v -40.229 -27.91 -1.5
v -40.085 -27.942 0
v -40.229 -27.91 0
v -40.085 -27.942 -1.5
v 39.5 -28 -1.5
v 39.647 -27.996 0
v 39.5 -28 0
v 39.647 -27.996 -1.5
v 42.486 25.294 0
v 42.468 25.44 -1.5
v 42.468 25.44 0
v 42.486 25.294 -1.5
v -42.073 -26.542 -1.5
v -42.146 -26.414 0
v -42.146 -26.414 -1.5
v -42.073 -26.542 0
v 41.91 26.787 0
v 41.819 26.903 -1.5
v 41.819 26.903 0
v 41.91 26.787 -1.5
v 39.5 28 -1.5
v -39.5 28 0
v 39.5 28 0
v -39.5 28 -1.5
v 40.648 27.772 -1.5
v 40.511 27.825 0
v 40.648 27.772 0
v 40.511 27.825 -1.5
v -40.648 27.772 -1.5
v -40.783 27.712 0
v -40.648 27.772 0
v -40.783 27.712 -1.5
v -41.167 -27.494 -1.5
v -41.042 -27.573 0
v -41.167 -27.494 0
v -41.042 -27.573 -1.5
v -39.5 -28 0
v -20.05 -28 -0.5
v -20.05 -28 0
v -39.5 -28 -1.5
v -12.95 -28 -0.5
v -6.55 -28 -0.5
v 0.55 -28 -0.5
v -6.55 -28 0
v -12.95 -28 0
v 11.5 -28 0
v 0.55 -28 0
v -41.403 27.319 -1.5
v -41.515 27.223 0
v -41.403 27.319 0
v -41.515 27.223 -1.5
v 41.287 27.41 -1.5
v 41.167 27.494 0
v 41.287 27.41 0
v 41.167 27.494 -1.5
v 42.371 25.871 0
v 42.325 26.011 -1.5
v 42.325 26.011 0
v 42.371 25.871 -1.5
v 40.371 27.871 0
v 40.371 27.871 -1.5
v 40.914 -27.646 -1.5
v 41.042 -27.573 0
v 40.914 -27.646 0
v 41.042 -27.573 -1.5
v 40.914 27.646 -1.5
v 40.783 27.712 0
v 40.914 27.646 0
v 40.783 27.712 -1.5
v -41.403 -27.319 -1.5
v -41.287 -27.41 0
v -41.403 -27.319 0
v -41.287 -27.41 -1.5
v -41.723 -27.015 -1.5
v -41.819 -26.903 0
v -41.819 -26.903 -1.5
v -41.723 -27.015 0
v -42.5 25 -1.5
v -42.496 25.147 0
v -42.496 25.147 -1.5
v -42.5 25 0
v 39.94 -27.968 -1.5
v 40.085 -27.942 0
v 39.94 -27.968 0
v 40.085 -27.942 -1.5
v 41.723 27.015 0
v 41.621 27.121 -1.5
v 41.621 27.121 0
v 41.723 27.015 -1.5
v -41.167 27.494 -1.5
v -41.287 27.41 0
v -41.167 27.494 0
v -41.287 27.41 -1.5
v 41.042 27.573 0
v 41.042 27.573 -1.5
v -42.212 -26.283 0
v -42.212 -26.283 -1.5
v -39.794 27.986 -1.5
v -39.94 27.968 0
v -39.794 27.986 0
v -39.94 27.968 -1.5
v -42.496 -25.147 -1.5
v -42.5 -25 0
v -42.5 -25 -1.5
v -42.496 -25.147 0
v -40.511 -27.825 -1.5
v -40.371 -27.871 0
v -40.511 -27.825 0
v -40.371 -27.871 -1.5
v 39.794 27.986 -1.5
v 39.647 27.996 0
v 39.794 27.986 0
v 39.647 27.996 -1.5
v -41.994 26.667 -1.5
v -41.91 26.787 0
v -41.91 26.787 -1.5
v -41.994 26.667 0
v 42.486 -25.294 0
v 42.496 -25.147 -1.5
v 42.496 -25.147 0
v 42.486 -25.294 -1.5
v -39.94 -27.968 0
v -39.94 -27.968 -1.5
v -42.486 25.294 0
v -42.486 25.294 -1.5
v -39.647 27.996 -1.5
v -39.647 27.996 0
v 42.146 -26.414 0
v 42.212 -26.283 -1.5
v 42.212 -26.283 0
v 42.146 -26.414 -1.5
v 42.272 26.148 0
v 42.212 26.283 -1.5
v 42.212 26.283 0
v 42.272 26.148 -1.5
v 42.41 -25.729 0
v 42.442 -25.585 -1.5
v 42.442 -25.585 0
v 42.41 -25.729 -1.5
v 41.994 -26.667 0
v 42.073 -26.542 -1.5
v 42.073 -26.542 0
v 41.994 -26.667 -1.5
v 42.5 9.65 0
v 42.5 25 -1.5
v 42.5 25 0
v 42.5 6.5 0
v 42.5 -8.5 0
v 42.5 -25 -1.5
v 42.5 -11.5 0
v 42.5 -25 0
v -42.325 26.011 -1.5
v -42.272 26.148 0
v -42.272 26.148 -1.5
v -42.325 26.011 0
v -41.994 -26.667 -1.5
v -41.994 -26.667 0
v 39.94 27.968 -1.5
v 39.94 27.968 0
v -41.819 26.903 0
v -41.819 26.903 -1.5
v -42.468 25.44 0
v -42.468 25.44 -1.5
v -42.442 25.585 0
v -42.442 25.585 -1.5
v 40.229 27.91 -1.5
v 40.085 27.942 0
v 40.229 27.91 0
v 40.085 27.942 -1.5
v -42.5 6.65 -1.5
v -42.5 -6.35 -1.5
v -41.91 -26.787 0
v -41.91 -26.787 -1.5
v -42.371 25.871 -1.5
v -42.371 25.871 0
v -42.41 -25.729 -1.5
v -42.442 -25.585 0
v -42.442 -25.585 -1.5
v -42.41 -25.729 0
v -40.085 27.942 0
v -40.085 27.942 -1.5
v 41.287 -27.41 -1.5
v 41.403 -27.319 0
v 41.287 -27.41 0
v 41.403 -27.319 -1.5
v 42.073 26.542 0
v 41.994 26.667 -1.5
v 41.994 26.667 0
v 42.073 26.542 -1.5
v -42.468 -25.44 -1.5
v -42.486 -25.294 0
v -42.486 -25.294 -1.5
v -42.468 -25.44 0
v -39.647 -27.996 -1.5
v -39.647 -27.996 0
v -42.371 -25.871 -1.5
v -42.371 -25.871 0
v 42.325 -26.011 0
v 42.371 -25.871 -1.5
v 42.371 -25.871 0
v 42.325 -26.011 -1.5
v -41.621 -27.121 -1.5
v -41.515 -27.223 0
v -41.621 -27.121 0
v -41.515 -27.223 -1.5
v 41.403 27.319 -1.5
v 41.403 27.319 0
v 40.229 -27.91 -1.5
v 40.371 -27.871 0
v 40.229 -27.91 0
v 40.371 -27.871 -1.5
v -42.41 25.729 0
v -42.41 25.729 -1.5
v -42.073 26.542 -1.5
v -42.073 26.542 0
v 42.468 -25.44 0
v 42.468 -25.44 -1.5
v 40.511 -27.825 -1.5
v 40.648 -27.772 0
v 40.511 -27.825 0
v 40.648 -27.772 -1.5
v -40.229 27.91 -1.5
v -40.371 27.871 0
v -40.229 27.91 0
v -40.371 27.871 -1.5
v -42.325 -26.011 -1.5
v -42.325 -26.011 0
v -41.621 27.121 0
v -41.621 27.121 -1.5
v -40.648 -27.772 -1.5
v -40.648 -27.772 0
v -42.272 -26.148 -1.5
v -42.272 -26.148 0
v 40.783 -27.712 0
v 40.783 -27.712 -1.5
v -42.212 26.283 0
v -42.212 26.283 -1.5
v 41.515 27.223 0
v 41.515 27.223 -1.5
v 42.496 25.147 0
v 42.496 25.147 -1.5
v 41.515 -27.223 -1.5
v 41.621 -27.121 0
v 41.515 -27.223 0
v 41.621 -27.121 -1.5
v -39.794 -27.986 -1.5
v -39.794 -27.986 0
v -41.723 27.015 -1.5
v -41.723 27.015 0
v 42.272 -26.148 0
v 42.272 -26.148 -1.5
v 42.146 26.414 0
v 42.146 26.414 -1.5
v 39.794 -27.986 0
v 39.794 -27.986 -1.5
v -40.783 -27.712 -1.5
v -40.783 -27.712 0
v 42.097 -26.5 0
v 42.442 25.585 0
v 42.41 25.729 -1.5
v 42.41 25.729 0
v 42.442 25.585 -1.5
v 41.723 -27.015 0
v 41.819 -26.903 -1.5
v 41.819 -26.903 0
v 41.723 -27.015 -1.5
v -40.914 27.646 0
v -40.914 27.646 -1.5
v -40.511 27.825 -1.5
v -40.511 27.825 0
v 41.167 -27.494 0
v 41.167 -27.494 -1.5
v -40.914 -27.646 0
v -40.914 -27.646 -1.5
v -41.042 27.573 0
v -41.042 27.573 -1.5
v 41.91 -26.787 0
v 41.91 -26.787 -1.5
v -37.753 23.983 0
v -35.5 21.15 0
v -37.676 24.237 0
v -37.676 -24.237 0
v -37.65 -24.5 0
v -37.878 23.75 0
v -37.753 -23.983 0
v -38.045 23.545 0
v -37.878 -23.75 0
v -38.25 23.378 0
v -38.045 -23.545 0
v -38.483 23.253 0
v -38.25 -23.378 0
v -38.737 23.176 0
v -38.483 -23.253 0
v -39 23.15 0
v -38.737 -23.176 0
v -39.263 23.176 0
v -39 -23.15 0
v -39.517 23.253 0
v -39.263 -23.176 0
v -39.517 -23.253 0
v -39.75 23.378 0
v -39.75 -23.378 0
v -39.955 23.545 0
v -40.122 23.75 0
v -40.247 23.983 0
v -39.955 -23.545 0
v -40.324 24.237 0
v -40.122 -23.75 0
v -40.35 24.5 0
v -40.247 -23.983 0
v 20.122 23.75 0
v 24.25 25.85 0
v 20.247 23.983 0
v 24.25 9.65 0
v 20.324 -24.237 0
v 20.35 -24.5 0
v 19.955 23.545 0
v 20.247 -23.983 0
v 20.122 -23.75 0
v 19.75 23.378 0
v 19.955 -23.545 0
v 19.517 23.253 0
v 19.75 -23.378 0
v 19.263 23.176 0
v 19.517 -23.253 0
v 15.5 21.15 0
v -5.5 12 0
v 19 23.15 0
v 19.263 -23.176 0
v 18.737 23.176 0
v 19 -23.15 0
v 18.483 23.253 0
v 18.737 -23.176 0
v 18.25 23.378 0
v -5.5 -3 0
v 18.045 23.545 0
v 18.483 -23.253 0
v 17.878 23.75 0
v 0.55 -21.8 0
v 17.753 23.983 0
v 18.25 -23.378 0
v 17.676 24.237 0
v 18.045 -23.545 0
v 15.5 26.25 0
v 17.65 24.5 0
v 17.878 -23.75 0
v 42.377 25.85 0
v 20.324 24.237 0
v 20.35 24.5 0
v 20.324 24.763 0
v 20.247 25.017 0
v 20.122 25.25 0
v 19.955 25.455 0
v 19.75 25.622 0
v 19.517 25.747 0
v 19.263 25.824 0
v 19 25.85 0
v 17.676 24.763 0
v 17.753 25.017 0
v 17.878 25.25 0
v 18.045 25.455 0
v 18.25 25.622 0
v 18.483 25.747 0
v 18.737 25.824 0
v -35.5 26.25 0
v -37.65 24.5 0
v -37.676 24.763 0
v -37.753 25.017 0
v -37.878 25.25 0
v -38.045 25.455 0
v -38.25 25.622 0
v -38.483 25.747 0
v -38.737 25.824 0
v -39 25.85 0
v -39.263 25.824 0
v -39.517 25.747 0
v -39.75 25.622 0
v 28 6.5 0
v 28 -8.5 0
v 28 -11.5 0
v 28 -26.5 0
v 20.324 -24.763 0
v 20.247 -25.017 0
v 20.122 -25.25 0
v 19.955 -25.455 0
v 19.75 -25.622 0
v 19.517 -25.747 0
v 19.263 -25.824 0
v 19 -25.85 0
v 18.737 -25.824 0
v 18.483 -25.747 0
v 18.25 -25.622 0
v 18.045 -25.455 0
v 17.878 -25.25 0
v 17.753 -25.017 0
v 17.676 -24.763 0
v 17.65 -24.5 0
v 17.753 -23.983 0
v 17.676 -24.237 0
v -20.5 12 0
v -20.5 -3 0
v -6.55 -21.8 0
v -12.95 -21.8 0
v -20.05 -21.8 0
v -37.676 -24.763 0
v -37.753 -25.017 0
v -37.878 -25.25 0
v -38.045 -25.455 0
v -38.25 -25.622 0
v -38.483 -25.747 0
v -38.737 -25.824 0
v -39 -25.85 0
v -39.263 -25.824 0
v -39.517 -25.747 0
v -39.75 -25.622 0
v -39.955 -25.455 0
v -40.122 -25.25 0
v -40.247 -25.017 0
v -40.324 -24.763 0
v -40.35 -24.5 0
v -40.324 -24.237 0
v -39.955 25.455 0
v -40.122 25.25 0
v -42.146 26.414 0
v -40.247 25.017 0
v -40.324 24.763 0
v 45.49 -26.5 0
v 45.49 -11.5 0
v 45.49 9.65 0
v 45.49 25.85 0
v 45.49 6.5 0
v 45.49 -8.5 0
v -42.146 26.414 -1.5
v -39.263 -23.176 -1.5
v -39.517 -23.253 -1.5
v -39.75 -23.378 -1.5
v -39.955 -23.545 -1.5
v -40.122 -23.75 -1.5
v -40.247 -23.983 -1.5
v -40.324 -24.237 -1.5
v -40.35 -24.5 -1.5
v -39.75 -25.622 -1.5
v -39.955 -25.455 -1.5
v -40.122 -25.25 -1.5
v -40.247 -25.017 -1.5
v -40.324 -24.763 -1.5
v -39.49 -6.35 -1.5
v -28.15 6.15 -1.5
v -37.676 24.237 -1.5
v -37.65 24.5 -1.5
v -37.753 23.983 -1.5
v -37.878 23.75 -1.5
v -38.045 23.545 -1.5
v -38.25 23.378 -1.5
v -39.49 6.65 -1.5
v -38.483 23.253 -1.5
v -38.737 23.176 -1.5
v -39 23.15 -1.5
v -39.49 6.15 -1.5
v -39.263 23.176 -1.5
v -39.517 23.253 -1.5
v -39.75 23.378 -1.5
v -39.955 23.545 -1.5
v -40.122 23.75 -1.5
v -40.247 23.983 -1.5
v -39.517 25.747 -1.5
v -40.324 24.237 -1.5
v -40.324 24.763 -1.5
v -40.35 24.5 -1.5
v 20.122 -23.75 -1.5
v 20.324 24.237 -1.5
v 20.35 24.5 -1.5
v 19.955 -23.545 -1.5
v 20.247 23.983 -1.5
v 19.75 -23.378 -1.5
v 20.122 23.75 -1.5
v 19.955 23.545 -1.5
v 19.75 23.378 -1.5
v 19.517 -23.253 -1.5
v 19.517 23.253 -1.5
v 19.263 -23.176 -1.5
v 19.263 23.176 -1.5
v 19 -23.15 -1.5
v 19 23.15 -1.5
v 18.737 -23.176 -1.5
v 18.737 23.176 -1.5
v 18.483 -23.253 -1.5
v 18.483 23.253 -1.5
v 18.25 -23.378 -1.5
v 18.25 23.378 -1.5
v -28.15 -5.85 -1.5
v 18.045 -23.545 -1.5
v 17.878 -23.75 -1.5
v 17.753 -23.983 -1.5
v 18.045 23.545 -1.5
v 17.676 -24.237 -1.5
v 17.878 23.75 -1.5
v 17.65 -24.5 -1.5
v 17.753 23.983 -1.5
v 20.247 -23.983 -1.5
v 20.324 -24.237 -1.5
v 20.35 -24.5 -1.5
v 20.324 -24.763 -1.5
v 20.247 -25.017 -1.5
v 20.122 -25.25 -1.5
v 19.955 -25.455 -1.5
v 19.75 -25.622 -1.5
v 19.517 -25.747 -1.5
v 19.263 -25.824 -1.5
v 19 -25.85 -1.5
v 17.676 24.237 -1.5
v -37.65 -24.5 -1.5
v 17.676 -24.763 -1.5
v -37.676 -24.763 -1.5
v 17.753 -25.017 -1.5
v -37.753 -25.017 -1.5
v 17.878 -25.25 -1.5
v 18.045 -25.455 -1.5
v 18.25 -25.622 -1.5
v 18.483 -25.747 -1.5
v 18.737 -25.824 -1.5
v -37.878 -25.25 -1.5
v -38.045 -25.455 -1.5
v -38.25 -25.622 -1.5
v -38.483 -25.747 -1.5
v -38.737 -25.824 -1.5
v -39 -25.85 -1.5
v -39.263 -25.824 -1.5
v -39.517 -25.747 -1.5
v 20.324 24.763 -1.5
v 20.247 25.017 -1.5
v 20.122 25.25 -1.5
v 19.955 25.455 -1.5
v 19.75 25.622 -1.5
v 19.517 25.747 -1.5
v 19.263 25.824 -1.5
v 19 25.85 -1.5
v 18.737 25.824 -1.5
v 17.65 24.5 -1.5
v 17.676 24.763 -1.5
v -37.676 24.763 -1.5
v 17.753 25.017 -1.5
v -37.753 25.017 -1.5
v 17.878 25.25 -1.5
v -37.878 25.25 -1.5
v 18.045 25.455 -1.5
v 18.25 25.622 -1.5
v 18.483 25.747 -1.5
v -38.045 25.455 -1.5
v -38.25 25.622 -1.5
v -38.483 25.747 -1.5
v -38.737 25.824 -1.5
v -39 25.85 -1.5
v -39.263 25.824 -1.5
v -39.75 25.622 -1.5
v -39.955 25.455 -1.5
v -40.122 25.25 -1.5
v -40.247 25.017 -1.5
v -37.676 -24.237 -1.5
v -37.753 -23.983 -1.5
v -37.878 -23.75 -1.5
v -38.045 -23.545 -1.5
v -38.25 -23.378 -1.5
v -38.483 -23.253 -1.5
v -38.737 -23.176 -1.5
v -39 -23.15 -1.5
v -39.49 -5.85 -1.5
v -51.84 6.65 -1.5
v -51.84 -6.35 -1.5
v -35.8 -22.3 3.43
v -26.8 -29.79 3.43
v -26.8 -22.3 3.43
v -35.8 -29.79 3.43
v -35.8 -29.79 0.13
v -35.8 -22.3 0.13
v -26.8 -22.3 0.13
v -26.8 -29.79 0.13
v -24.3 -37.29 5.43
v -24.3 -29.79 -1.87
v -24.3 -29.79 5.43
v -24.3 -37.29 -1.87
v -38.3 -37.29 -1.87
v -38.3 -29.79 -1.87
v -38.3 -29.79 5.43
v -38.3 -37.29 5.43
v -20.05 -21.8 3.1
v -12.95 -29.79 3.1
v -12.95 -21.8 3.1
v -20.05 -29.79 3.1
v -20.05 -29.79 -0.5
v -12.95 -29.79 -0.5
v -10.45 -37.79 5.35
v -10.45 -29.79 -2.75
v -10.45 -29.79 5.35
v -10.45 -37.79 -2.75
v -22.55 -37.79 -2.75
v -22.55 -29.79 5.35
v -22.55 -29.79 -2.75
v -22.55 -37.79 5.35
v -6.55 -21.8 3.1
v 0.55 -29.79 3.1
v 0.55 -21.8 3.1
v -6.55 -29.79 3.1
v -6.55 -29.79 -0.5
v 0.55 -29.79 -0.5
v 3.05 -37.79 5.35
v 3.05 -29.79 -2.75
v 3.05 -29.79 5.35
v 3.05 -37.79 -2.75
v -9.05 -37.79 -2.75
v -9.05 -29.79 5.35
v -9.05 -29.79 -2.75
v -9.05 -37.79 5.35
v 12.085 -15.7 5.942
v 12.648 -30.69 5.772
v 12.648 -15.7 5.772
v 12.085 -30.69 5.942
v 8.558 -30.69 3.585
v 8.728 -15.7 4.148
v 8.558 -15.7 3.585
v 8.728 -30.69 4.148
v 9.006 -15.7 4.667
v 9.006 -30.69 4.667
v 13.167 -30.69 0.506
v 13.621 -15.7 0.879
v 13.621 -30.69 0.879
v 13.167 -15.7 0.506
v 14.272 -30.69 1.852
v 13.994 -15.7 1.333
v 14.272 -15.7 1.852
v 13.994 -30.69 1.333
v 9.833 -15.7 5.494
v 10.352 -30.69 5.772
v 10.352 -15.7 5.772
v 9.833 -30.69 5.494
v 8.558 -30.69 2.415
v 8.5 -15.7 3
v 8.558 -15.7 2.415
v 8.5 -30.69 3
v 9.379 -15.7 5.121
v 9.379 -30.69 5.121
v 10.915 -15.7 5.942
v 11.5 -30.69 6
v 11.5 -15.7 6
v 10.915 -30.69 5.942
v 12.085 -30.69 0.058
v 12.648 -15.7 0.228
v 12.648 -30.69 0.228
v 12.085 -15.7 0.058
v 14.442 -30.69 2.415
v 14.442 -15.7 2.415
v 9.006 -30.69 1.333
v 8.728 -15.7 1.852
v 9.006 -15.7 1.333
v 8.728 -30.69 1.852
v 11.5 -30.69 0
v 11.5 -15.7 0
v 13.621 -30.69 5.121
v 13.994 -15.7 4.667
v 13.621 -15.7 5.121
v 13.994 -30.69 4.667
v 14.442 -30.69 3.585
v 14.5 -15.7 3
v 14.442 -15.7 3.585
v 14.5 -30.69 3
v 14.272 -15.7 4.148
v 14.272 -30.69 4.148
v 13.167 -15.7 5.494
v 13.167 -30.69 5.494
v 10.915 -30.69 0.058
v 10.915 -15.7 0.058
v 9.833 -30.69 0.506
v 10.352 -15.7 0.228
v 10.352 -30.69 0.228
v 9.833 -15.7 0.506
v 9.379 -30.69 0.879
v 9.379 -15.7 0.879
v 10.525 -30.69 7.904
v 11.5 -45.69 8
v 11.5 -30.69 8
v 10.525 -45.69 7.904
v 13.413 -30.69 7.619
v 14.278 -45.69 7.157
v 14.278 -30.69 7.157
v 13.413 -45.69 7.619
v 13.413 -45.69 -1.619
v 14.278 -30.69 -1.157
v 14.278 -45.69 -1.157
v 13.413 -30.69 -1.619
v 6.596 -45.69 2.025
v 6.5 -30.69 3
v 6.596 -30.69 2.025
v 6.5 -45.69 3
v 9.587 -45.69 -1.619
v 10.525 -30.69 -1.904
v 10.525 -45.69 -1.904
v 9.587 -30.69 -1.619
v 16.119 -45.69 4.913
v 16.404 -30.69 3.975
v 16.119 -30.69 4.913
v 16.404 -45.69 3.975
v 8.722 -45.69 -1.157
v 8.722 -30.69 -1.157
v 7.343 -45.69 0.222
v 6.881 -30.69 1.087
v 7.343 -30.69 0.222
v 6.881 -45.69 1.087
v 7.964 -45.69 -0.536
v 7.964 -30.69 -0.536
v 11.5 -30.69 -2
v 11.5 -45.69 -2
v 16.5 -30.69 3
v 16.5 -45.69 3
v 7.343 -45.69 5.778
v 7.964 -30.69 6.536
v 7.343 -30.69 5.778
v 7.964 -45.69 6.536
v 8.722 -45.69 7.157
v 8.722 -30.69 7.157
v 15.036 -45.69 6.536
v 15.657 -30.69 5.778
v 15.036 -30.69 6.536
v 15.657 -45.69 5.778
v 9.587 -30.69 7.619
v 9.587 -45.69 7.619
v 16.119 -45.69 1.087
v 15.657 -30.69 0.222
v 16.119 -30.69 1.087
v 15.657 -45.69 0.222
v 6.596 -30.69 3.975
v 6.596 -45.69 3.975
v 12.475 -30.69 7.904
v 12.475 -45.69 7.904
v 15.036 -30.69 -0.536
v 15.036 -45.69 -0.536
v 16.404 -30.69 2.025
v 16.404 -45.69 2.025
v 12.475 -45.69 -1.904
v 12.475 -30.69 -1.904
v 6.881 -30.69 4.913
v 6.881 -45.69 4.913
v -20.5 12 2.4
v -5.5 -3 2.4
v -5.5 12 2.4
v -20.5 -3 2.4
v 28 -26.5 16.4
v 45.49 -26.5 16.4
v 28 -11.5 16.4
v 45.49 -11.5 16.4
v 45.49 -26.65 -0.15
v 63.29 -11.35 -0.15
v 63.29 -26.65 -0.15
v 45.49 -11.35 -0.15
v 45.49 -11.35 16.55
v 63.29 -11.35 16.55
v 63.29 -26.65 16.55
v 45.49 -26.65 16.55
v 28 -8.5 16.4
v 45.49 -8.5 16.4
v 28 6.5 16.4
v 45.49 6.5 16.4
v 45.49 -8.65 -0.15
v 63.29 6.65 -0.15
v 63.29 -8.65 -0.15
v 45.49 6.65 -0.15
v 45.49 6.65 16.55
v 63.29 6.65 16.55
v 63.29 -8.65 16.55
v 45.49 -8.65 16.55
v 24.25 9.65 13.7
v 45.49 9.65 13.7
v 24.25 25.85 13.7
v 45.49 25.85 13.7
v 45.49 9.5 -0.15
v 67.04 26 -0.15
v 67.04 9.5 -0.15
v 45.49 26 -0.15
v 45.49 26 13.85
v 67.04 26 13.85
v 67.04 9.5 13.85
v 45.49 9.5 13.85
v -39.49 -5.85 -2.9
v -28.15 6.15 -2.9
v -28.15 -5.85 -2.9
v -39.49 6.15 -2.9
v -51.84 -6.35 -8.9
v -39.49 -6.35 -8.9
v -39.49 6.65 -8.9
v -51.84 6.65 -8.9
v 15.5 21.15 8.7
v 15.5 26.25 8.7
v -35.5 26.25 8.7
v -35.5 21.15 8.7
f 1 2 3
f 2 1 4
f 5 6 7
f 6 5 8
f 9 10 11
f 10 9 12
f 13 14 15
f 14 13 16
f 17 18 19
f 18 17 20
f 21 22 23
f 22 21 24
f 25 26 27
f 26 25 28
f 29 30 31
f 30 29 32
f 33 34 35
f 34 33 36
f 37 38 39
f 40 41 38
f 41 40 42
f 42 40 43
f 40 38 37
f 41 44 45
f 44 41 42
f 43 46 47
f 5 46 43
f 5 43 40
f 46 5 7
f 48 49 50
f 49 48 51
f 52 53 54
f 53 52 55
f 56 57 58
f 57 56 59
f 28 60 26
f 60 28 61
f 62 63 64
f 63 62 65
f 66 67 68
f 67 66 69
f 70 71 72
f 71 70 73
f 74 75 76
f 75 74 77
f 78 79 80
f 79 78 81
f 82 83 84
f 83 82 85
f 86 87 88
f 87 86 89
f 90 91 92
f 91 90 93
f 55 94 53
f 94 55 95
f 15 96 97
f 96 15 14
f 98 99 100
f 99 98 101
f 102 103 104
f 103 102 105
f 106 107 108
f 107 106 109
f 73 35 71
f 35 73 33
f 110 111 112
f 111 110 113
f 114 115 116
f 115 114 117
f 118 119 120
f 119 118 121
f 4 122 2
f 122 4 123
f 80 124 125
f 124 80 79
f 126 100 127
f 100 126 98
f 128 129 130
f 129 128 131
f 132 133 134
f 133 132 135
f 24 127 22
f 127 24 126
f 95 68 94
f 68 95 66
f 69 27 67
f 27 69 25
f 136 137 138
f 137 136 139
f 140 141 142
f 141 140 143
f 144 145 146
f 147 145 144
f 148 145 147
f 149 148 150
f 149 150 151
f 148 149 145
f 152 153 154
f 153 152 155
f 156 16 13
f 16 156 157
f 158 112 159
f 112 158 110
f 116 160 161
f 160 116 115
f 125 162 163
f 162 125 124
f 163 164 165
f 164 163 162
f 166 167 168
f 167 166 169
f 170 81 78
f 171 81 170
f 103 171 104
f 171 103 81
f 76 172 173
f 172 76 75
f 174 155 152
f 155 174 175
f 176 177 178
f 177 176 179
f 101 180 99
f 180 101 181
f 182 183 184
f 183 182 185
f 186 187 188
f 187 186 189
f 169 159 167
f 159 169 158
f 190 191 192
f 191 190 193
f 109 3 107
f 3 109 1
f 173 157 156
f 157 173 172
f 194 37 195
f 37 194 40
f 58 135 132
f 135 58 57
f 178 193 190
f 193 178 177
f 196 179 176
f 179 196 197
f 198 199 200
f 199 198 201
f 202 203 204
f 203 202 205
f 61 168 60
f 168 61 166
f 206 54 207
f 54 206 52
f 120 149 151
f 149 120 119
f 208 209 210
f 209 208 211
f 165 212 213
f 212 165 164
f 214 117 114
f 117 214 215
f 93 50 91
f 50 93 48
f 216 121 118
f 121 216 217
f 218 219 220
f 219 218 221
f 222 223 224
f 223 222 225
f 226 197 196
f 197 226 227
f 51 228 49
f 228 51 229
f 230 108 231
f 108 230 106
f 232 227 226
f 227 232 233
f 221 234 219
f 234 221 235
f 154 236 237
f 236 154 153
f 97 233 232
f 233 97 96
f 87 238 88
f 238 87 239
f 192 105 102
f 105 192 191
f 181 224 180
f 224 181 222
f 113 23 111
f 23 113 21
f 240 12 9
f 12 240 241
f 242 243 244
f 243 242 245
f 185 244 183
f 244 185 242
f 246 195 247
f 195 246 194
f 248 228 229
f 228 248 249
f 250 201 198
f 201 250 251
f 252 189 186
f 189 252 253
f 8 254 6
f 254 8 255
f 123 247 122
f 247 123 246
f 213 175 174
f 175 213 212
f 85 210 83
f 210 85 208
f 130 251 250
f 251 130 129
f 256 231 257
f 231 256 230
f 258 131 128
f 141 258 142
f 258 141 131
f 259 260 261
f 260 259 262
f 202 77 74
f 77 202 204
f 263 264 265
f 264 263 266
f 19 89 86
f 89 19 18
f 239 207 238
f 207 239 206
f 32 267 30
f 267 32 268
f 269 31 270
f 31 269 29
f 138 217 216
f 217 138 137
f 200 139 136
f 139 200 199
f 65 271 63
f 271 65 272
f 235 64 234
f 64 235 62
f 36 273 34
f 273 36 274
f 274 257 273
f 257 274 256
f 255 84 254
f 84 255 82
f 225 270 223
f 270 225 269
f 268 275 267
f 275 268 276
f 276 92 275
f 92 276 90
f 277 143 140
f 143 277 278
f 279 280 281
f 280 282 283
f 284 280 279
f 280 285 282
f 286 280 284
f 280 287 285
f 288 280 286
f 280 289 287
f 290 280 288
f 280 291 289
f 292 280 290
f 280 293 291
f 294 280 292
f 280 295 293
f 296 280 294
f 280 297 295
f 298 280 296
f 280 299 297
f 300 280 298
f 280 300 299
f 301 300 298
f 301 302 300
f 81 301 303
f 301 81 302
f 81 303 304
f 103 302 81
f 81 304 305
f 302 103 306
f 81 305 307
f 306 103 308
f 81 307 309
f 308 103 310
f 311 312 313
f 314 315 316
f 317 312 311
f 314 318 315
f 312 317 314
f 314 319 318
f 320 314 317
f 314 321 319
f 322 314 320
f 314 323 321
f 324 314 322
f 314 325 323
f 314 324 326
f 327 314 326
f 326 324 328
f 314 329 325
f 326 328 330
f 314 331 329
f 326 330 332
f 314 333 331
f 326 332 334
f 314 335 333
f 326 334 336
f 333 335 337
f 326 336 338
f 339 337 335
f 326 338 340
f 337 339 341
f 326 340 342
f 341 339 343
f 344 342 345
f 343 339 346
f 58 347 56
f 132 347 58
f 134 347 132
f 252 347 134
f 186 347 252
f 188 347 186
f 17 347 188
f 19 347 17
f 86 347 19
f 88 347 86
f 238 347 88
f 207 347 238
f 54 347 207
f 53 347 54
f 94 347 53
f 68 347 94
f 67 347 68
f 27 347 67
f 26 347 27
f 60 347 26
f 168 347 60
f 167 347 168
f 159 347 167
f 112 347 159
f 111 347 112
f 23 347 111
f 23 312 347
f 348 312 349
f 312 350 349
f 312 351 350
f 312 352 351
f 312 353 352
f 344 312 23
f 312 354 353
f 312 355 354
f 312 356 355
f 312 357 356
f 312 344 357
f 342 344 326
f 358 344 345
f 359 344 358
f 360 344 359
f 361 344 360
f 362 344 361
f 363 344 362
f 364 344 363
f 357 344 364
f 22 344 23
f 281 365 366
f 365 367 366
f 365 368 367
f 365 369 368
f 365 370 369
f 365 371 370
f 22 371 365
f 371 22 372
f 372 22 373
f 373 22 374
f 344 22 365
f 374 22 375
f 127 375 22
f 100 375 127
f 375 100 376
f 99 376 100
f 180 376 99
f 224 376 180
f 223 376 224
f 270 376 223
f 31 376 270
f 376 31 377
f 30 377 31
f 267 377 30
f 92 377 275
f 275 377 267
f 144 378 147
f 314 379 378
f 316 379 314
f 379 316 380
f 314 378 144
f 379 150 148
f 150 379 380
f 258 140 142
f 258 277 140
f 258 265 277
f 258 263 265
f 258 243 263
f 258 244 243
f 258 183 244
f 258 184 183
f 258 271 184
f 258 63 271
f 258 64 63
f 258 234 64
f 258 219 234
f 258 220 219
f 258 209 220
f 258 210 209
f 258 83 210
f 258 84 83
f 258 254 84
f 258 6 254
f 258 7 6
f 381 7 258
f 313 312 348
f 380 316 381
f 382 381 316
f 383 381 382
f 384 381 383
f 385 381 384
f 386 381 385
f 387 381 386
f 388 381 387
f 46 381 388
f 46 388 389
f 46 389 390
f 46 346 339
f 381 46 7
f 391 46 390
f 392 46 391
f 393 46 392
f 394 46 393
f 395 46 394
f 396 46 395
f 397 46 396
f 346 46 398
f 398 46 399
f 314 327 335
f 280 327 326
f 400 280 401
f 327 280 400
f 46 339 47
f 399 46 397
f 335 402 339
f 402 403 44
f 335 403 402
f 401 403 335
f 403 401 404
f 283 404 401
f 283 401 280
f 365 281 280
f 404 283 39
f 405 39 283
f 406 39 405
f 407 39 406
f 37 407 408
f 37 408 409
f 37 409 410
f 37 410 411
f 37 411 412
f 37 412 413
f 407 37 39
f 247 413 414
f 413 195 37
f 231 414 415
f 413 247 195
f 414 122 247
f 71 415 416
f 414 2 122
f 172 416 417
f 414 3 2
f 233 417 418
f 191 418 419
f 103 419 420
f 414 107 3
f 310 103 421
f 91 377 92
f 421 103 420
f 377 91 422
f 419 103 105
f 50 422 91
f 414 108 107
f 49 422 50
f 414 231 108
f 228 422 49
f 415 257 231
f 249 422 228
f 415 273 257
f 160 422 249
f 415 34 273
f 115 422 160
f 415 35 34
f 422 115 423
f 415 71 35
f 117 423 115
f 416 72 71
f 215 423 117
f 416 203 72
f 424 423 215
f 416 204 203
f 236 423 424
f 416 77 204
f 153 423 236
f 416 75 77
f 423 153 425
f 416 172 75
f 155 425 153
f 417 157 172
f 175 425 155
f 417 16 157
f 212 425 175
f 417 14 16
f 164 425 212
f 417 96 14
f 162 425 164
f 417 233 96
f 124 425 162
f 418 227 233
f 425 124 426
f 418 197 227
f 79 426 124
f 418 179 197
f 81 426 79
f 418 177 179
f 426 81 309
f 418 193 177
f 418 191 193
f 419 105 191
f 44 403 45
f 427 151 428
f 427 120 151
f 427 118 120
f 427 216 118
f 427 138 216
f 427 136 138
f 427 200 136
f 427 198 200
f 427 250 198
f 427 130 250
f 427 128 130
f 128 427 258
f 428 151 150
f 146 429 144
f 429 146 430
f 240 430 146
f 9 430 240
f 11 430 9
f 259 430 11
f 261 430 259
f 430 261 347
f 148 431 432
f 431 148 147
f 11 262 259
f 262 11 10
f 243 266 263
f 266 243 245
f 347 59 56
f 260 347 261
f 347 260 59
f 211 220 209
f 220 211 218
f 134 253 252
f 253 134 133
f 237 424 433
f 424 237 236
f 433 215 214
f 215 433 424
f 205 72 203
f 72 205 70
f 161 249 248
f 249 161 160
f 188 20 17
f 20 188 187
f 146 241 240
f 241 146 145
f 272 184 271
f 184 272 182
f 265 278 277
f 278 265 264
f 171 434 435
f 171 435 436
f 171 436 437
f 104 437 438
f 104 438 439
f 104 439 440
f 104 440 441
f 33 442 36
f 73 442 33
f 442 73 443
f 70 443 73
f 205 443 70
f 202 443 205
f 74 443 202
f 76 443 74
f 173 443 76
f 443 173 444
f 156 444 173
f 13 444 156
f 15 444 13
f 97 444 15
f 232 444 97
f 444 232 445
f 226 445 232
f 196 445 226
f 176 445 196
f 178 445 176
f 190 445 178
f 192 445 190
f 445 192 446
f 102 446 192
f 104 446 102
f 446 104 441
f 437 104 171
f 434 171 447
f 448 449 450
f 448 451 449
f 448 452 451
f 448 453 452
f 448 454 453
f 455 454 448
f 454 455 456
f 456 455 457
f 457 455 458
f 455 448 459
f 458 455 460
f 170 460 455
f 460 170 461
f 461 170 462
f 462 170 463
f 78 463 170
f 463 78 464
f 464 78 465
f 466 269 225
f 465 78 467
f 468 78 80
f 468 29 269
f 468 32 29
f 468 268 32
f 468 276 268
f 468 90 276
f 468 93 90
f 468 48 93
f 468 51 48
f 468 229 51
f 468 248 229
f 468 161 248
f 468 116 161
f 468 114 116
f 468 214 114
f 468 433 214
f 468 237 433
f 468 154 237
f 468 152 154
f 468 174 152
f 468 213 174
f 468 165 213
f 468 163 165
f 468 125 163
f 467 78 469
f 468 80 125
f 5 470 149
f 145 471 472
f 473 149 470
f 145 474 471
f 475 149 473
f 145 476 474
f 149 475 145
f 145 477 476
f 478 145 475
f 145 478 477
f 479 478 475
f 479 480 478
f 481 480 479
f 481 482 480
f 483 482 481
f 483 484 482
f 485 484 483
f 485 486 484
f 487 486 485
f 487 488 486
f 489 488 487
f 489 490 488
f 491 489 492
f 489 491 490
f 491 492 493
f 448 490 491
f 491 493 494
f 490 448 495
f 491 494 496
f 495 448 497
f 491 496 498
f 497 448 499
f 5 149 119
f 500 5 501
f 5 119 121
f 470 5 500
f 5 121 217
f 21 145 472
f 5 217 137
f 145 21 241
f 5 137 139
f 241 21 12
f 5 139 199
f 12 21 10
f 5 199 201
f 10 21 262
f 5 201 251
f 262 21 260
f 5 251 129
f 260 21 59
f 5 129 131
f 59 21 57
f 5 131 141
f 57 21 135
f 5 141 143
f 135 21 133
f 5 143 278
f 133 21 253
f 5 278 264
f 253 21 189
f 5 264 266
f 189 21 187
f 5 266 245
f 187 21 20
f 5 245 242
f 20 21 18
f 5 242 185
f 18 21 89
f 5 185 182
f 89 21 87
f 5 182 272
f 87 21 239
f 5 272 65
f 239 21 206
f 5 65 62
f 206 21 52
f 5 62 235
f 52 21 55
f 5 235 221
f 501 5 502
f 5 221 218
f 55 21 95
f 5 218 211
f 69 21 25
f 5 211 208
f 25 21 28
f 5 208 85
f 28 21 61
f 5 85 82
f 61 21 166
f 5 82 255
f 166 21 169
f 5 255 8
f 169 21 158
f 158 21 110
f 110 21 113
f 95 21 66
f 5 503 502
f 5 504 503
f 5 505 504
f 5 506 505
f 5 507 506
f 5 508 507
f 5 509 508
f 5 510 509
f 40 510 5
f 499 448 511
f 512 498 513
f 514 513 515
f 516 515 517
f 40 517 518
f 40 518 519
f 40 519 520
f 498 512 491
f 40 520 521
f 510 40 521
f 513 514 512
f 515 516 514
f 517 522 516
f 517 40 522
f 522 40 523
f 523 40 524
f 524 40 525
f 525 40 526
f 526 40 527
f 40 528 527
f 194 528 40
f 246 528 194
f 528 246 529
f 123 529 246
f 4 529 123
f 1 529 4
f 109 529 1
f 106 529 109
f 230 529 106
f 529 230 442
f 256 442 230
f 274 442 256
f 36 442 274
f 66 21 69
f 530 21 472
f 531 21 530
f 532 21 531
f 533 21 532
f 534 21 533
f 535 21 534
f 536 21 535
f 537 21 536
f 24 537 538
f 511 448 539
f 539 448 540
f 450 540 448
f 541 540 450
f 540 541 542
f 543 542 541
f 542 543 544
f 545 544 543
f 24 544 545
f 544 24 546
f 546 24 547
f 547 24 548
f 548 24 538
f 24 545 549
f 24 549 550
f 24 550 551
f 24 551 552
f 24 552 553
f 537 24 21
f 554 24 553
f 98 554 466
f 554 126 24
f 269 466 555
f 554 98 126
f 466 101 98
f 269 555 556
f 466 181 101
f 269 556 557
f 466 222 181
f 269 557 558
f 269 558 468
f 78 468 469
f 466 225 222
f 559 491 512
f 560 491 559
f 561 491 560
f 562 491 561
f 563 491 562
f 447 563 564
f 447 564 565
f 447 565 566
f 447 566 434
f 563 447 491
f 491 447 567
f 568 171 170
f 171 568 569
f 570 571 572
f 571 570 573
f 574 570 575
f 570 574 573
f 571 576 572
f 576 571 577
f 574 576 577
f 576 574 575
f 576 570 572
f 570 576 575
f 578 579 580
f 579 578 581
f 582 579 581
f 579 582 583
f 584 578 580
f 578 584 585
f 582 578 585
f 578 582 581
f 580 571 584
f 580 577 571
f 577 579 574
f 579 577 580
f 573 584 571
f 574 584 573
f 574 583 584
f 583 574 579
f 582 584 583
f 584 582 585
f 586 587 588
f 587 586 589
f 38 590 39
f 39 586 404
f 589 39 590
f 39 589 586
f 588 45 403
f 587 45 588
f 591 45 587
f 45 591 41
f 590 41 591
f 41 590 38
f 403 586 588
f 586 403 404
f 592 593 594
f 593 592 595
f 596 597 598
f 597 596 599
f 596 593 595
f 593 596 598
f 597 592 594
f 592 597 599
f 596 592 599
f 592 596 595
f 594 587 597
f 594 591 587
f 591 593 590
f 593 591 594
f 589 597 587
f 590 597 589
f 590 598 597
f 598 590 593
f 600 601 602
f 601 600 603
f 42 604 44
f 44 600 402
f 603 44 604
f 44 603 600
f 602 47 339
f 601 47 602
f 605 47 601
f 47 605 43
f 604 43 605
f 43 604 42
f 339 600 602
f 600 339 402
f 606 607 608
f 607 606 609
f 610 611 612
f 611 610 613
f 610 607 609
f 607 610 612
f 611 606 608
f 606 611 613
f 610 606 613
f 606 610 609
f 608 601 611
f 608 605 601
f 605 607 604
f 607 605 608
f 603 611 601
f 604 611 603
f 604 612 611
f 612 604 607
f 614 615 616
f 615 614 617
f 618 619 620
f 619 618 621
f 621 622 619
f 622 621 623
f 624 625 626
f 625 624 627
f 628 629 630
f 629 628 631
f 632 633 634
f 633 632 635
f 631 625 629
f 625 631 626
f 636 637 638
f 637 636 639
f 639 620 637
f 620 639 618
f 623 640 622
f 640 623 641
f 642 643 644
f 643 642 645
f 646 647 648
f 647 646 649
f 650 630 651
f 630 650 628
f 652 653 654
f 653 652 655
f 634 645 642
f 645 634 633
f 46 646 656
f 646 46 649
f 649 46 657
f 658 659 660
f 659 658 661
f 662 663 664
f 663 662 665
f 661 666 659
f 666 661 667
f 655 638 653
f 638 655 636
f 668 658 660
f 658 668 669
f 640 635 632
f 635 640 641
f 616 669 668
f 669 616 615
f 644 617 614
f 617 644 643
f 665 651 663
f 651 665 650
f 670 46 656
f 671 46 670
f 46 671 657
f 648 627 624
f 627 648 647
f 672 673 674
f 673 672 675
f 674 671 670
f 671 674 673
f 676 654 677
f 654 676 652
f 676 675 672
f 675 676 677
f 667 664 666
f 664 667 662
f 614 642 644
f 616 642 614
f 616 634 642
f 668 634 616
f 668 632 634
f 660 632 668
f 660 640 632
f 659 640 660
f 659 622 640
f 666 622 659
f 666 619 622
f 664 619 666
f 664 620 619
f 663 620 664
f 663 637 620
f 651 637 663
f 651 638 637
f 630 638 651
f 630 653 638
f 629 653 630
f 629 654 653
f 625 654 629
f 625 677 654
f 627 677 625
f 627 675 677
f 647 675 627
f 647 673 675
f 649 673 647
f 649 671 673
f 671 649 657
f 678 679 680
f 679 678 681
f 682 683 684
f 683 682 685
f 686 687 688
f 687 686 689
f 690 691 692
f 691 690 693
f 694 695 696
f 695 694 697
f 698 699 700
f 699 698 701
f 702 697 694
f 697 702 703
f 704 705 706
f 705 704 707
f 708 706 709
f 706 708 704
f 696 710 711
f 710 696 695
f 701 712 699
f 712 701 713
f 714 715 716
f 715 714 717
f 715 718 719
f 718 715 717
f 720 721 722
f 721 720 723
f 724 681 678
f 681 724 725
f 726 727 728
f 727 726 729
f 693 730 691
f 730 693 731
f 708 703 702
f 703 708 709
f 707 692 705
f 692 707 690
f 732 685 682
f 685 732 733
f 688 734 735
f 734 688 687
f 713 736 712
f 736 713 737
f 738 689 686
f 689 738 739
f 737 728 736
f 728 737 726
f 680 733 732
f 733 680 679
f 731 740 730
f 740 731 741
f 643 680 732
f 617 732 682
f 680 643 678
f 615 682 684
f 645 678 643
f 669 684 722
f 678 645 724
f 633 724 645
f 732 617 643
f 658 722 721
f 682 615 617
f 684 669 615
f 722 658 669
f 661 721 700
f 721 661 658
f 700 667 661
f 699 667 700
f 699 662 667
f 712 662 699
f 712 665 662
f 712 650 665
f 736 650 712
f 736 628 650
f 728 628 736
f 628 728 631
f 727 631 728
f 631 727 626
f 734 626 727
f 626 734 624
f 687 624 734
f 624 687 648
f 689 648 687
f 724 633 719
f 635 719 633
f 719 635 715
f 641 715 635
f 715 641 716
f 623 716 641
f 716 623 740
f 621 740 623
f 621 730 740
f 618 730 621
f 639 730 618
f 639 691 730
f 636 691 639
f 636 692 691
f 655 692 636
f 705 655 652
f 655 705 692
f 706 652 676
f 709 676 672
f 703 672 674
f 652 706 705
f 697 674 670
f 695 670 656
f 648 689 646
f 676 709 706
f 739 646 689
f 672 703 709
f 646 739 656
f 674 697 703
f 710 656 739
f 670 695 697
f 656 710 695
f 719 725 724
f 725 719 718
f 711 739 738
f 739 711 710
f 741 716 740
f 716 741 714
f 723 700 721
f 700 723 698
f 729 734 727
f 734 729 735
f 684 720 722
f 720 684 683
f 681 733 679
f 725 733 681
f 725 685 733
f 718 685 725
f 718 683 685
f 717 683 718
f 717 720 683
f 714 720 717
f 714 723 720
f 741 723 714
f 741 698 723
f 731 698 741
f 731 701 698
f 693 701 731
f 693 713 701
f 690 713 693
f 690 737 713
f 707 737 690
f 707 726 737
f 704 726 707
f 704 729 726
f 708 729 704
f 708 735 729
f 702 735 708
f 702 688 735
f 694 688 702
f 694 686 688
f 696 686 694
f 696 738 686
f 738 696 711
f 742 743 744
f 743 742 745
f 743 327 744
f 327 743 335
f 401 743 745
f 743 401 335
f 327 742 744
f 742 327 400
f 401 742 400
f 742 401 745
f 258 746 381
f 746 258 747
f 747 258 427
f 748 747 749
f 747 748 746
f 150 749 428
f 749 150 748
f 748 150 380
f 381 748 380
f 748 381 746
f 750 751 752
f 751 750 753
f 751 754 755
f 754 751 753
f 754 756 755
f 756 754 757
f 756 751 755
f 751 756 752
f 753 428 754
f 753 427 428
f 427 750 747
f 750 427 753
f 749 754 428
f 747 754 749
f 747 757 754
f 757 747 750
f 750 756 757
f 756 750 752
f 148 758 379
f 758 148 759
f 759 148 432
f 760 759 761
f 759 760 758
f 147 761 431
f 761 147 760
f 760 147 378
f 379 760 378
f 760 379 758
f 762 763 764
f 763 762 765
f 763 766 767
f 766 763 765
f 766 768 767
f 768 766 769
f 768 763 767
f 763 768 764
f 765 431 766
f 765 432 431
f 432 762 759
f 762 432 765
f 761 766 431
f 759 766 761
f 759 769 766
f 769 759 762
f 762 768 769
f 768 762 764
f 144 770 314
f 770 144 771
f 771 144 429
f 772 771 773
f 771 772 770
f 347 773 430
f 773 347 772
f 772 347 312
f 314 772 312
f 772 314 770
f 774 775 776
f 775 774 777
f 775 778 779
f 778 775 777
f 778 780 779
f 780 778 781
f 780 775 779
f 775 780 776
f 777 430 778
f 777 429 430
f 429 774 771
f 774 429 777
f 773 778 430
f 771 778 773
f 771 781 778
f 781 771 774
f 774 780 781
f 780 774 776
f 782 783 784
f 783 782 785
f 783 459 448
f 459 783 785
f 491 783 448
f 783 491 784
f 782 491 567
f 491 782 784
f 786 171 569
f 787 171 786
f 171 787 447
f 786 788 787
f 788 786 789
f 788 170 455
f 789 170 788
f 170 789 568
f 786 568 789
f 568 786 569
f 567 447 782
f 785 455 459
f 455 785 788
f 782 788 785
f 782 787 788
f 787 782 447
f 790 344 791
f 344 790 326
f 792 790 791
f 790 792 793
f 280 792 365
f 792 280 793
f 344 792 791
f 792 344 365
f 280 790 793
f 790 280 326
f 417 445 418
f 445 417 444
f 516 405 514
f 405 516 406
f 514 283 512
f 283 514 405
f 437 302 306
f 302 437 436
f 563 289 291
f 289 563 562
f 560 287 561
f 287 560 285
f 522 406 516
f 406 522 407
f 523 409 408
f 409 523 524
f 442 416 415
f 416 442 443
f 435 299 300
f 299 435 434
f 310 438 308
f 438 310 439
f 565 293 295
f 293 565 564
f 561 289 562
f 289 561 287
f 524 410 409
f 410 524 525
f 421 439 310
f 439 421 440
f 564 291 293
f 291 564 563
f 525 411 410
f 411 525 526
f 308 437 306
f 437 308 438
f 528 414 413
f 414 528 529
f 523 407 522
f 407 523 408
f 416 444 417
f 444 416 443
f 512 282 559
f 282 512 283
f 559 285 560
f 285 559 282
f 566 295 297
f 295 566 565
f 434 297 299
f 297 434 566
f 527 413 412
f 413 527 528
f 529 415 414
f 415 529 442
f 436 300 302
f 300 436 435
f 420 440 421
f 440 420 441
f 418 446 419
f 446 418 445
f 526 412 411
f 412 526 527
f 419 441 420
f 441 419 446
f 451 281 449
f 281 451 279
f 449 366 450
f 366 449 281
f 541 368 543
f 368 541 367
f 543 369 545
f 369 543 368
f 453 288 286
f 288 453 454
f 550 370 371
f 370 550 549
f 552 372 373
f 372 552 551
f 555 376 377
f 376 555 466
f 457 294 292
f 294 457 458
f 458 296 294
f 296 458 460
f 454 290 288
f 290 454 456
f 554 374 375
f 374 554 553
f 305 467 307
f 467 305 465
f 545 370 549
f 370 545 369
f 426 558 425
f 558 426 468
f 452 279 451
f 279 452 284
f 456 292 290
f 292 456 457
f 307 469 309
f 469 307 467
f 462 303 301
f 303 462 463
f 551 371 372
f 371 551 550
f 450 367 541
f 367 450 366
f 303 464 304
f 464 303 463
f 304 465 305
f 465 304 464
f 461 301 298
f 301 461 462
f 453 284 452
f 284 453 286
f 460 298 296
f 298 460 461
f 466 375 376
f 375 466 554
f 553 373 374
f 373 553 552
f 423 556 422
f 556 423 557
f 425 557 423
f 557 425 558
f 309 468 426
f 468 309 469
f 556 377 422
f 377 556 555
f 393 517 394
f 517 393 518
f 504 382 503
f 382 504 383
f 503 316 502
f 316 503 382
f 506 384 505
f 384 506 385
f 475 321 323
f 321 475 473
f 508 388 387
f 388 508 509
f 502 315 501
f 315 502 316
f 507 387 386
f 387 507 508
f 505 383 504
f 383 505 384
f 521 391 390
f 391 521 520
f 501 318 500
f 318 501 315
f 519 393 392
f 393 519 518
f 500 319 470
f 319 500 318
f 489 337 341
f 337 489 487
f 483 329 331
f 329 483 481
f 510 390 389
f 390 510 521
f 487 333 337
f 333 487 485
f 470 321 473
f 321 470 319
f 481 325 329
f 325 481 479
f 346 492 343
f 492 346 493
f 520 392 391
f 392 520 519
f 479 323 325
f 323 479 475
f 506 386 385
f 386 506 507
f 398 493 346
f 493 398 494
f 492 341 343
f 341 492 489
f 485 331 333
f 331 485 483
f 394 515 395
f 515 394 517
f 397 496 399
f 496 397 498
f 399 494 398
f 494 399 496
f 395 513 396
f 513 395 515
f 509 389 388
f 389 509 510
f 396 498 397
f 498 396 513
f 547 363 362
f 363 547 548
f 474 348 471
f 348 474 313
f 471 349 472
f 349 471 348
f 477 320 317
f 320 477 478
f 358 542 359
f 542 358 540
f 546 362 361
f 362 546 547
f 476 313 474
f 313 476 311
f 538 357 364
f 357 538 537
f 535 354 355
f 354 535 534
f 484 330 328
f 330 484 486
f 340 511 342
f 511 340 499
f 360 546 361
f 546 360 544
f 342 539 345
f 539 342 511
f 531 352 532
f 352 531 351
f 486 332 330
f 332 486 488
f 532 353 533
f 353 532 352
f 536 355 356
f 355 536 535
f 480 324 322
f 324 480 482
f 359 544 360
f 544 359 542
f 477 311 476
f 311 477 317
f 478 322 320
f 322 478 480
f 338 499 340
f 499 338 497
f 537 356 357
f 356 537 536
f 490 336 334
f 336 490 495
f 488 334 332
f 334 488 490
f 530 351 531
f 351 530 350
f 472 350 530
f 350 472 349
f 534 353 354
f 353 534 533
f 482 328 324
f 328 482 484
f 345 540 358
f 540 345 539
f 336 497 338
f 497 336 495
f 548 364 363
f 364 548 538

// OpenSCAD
// Start: lazy_union
default_5_default_5();
// End: lazy_union

// Modules.

// 'PartMaterial undef-default - default 5.0'
module default_5_default_5() {
  // 'None : _combine_solids_and_holes'
  union() {
    // '_combine_solids_and_holes'
    difference() {
      // 'default : _combine_solids_and_holes'
      union() {
        // 'board'
        multmatrix(m=[[1.0, 0.0, 0.0, 0.0], [0.0, 1.0, 0.0, 0.0], [0.0, 0.0, 1.0, -0.75], [0.0, 0.0, 0.0, 1.0]]) {
          // 'board : _combine_solids_and_holes'
          union() {
            // 'hull'
            multmatrix(m=[[1.0, 0.0, 0.0, -42.5], [0.0, 1.0, 0.0, -28.0], [0.0, 0.0, 1.0, -0.75], [0.0, 0.0, 0.0, 1.0]]) {
              // 'hull : _combine_solids_and_holes'
              union() {
                // 'hull'
                linear_extrude(height=1.5, twist=0.0, slices=4, scale=[1.0, 1.0]) {
                  polygon(points=[[3.0, 0.0], [82.0, 0.0], [82.14720302298225, 0.003613631384482119], [82.29405142098868, 0.014445819983408104], [82.44019142336609, 0.03247047010565529], [82.58527096604838, 0.05764415879030649], [82.7289405397098, 0.08990624041636508], [82.87085403176339, 0.1291789928033702], [83.01066956017667, 0.17536780445093392], [83.14805029709527, 0.228361402466136], [83.28266528029084, 0.2880321206296661], [83.414190210478, 0.35423620695493074], [83.54230823257967, 0.4268141699991794], [83.66671069905881, 0.50559116309236], [83.7870979134773, 0.5903774055580606], [83.90317985249094, 0.6809686399117845], [84.01467686454106, 0.7771466239351184], [84.12132034355965, 0.8786796564403532], [84.22285337606488, 0.9853231354589407], [84.31903136008822, 1.0968201475090595], [84.40962259444194, 1.2129020865226963], [84.49440883690764, 1.33328930094119], [84.57318583000082, 1.4576917674203314], [84.64576379304506, 1.5858097895220038], [84.71196787937033, 1.7173347197091513], [84.77163859753387, 1.8519497029047285], [84.82463219554907, 1.9893304398233378], [84.87082100719662, 2.129145968236611], [84.91009375958363, 2.271059460290207], [84.94235584120969, 2.414729033951614], [84.96752952989435, 2.5598085766339143], [84.98555418001659, 2.705948579011318], [84.99638636861552, 2.8527969770177455], [85.0, 2.9999999999999996], [85.0, 53.0], [84.99638636861552, 53.147203022982254], [84.98555418001659, 53.29405142098868], [84.96752952989435, 53.44019142336609], [84.94235584120969, 53.585270966048384], [84.91009375958363, 53.72894053970979], [84.87082100719662, 53.870854031763386], [84.82463219554906, 54.01066956017666], [84.77163859753387, 54.14805029709527], [84.71196787937033, 54.28266528029084], [84.64576379304506, 54.41419021047799], [84.57318583000081, 54.542308232579664], [84.49440883690764, 54.666710699058804], [84.40962259444193, 54.7870979134773], [84.3190313600882, 54.90317985249093], [84.22285337606488, 55.01467686454105], [84.12132034355965, 55.12132034355964], [84.01467686454106, 55.22285337606487], [83.90317985249094, 55.3190313600882], [83.7870979134773, 55.40962259444193], [83.66671069905881, 55.49440883690763], [83.54230823257966, 55.57318583000081], [83.414190210478, 55.645763793045056], [83.28266528029084, 55.71196787937032], [83.14805029709527, 55.77163859753385], [83.01066956017667, 55.82463219554905], [82.87085403176339, 55.87082100719662], [82.7289405397098, 55.910093759583624], [82.58527096604838, 55.94235584120968], [82.44019142336609, 55.96752952989433], [82.29405142098868, 55.98555418001658], [82.14720302298225, 55.996386368615504], [82.0, 55.999999999999986], [3.0, 56.0], [2.852796977017746, 55.99638636861552], [2.7059485790113182, 55.98555418001659], [2.5598085766339143, 55.96752952989434], [2.4147290339516143, 55.94235584120969], [2.271059460290207, 55.91009375958363], [2.129145968236611, 55.870821007196625], [1.9893304398233378, 55.824632195549064], [1.8519497029047285, 55.77163859753386], [1.717334719709152, 55.711967879370334], [1.5858097895220038, 55.64576379304506], [1.4576917674203314, 55.57318583000082], [1.3332893009411895, 55.49440883690764], [1.2129020865226958, 55.409622594441934], [1.096820147509059, 55.31903136008821], [0.9853231354589402, 55.222853376064876], [0.8786796564403523, 55.121320343559645], [0.777146623935117, 55.01467686454106], [0.6809686399117831, 54.903179852490936], [0.5903774055580588, 54.787097913477304], [0.5055911630923573, 54.66671069905881], [0.4268141699991759, 54.542308232579664], [0.3542362069549263, 54.41419021047799], [0.2880321206296612, 54.28266528029085], [0.22836140246613024, 54.14805029709527], [0.1753678044509277, 54.01066956017666], [0.1291789928033631, 53.870854031763386], [0.08990624041635709, 53.72894053970979], [0.05764415879029716, 53.585270966048384], [0.03247047010564508, 53.44019142336609], [0.014445819983396557, 53.29405142098868], [0.0036136313844692403, 53.147203022982254], [-1.4210854715202004e-14, 53.0], [0.0, 3.0], [0.003613631384483007, 2.852796977017747], [0.014445819983409436, 2.7059485790113182], [0.03247047010565707, 2.559808576633915], [0.05764415879030871, 2.414729033951615], [0.08990624041636819, 2.2710594602902088], [0.1291789928033733, 2.129145968236614], [0.17536780445093747, 1.9893304398233398], [0.22836140246613956, 1.851949702904731], [0.28803212062966965, 1.7173347197091546], [0.35423620695493474, 1.5858097895220071], [0.42681416999918387, 1.4576917674203353], [0.5055911630923635, 1.3332893009411941], [0.5903774055580651, 1.2129020865227003], [0.6809686399117885, 1.0968201475090642], [0.7771466239351228, 0.9853231354589447], [0.8786796564403572, 0.8786796564403576], [0.9853231354589438, 0.7771466239351232], [1.0968201475090622, 0.6809686399117902], [1.2129020865227007, 0.5903774055580646], [1.3332893009411935, 0.5055911630923644], [1.4576917674203347, 0.42681416999918387], [1.5858097895220065, 0.3542362069549352], [1.7173347197091526, 0.28803212062967054], [1.851949702904729, 0.22836140246614045], [1.9893304398233402, 0.17536780445093747], [2.129145968236613, 0.1291789928033733], [2.271059460290208, 0.08990624041636819], [2.414729033951614, 0.05764415879030915], [2.5598085766339156, 0.03247047010565707], [2.7059485790113187, 0.014445819983409436], [2.852796977017746, 0.003613631384483007]]);
                }
              }
            }
          }
        }
        // 'usbC'
        multmatrix(m=[[-1.0, 0.0, 0.0, -26.8], [0.0, -1.0, 0.0, -22.3], [0.0, 0.0, 1.0, 0.13000000000000034], [0.0, 0.0, 0.0, 1.0]]) {
          // 'usbC'
          color(c=[0.0, 1.0, 0.5, 1.0]) {
            // 'usbC : _combine_solids_and_holes'
            union() {
              // 'usbC'
              cube(size=[9.0, 7.5, 3.3]);
            }
          }
        }
        // ('usbC', 'outer')
        multmatrix(m=[[-1.0, 0.0, 0.0, -24.3], [0.0, 1.0, 0.0, -37.29], [0.0, 0.0, -1.0, 5.43], [0.0, 0.0, 0.0, 1.0]]) {
          // "('usbC', 'outer') : _combine_solids_and_holes"
          union() {
            // ('usbC', 'outer')
            cube(size=[14.0, 7.5, 7.3]);
          }
        }
        // 'hdmi1'
        multmatrix(m=[[-1.0, 0.0, 0.0, -12.95], [0.0, -1.0, 0.0, -21.8], [0.0, 0.0, 1.0, -0.5], [0.0, 0.0, 0.0, 1.0]]) {
          // 'hdmi1'
          color(c=[0.0, 1.0, 0.5, 1.0]) {
            // 'hdmi1 : _combine_solids_and_holes'
            union() {
              // 'hdmi1'
              cube(size=[7.1, 8.0, 3.6]);
            }
          }
        }
        // ('hdmi1', 'outer')
        multmatrix(m=[[-1.0, 0.0, 0.0, -10.45], [0.0, 1.0, 0.0, -37.79], [0.0, 0.0, -1.0, 5.35], [0.0, 0.0, 0.0, 1.0]]) {
          // "('hdmi1', 'outer') : _combine_solids_and_holes"
          union() {
            // ('hdmi1', 'outer')
            cube(size=[12.1, 8.0, 8.1]);
          }
        }
        // 'hdmi2'
        multmatrix(m=[[-1.0, 0.0, 0.0, 0.5499999999999998], [0.0, -1.0, 0.0, -21.8], [0.0, 0.0, 1.0, -0.5], [0.0, 0.0, 0.0, 1.0]]) {
          // 'hdmi2'
          color(c=[0.0, 1.0, 0.5, 1.0]) {
            // 'hdmi2 : _combine_solids_and_holes'
            union() {
              // 'hdmi2'
              cube(size=[7.1, 8.0, 3.6]);
            }
          }
        }
        // ('hdmi2', 'outer')
        multmatrix(m=[[-1.0, 0.0, 0.0, 3.05], [0.0, 1.0, 0.0, -37.79], [0.0, 0.0, -1.0, 5.35], [0.0, 0.0, 0.0, 1.0]]) {
          // "('hdmi2', 'outer') : _combine_solids_and_holes"
          union() {
            // ('hdmi2', 'outer')
            cube(size=[12.1, 8.0, 8.1]);
          }
        }
        // 'audio'
        multmatrix(m=[[-1.0, 0.0, 0.0, 11.5], [0.0, 0.0, 1.0, -30.7], [0.0, 1.0, 0.0, 3.0], [0.0, 0.0, 0.0, 1.0]]) {
          // 'audio'
          color(c=[0.0, 1.0, 0.5, 1.0]) {
            // 'audio : _combine_solids_and_holes'
            union() {
              // 'audio'
              cylinder(h=15.0, r1=3.0, r2=3.0, center=false, $fn=32);
            }
          }
        }
        // ('audio', 'outer')
        multmatrix(m=[[-1.0, 0.0, 0.0, 11.5], [0.0, 0.0, -1.0, -30.689999999999998], [0.0, -1.0, 0.0, 3.0], [0.0, 0.0, 0.0, 1.0]]) {
          // "('audio', 'outer') : _combine_solids_and_holes"
          union() {
            // ('audio', 'outer')
            cylinder(h=15.0, r1=5.0, r2=5.0, center=false, $fn=32);
          }
        }
        // 'cpu'
        multmatrix(m=[[-1.0, 0.0, 0.0, -5.5], [0.0, -1.0, 0.0, 12.0], [0.0, 0.0, 1.0, 0.0], [0.0, 0.0, 0.0, 1.0]]) {
          // 'cpu'
          color(c=[0.0, 1.0, 0.5, 1.0]) {
            // 'cpu : _combine_solids_and_holes'
            union() {
              // 'cpu'
              cube(size=[15.0, 15.0, 2.4]);
            }
          }
        }
        // 'usbA2'
        multmatrix(m=[[0.0, 1.0, 0.0, 28.0], [-1.0, 0.0, 0.0, -11.5], [0.0, 0.0, 1.0, 0.0], [0.0, 0.0, 0.0, 1.0]]) {
          // 'usbA2'
          color(c=[0.0, 1.0, 0.5, 1.0]) {
            // 'usbA2 : _combine_solids_and_holes'
            union() {
              // 'usbA2'
              cube(size=[15.0, 17.5, 16.4]);
            }
          }
        }
        // ('usbA2', 'outer')
        multmatrix(m=[[0.0, -1.0, 0.0, 63.290000000000006], [-1.0, 0.0, 0.0, -11.35], [0.0, 0.0, -1.0, 16.549999999999997], [0.0, 0.0, 0.0, 1.0]]) {
          // "('usbA2', 'outer') : _combine_solids_and_holes"
          union() {
            // ('usbA2', 'outer')
            cube(size=[15.3, 17.8, 16.7]);
          }
        }
        // 'usbA3'
        multmatrix(m=[[0.0, 1.0, 0.0, 28.0], [-1.0, 0.0, 0.0, 6.5], [0.0, 0.0, 1.0, 0.0], [0.0, 0.0, 0.0, 1.0]]) {
          // 'usbA3'
          color(c=[0.0, 1.0, 0.5, 1.0]) {
            // 'usbA3 : _combine_solids_and_holes'
            union() {
              // 'usbA3'
              cube(size=[15.0, 17.5, 16.4]);
            }
          }
        }
        // ('usbA3', 'outer')
        multmatrix(m=[[0.0, -1.0, 0.0, 63.290000000000006], [-1.0, 0.0, 0.0, 6.65], [0.0, 0.0, -1.0, 16.549999999999997], [0.0, 0.0, 0.0, 1.0]]) {
          // "('usbA3', 'outer') : _combine_solids_and_holes"
          union() {
            // ('usbA3', 'outer')
            cube(size=[15.3, 17.8, 16.7]);
          }
        }
        // 'rj45'
        multmatrix(m=[[0.0, 1.0, 0.0, 24.25], [-1.0, 0.0, 0.0, 25.85], [0.0, 0.0, 1.0, 0.0], [0.0, 0.0, 0.0, 1.0]]) {
          // 'rj45'
          color(c=[0.0, 1.0, 0.5, 1.0]) {
            // 'rj45 : _combine_solids_and_holes'
            union() {
              // 'rj45'
              cube(size=[16.2, 21.25, 13.7]);
            }
          }
        }
        // ('rj45', 'outer')
        multmatrix(m=[[0.0, -1.0, 0.0, 67.04], [-1.0, 0.0, 0.0, 26.0], [0.0, 0.0, -1.0, 13.85], [0.0, 0.0, 0.0, 1.0]]) {
          // "('rj45', 'outer') : _combine_solids_and_holes"
          union() {
            // ('rj45', 'outer')
            cube(size=[16.5, 21.55, 14.0]);
          }
        }
        // 'micro_sd'
        multmatrix(m=[[0.0, -1.0, 0.0, -28.15], [-1.0, 0.0, 0.0, 6.149999999999999], [0.0, 0.0, -1.0, -1.5], [0.0, 0.0, 0.0, 1.0]]) {
          // 'micro_sd'
          color(c=[0.0, 1.0, 0.5, 1.0]) {
            // 'micro_sd : _combine_solids_and_holes'
            union() {
              // 'micro_sd'
              cube(size=[12.0, 11.35, 1.4]);
            }
          }
        }
        // ('micro_sd', 'outer')
        multmatrix(m=[[0.0, 1.0, 0.0, -51.84], [-1.0, 0.0, 0.0, 6.649999999999999], [0.0, 0.0, 1.0, -8.9], [0.0, 0.0, 0.0, 1.0]]) {
          // "('micro_sd', 'outer') : _combine_solids_and_holes"
          union() {
            // ('micro_sd', 'outer')
            cube(size=[13.0, 12.35, 7.4]);
          }
        }
        // 'header100'
        multmatrix(m=[[1.0, 0.0, 0.0, -35.5], [0.0, 1.0, 0.0, 21.15], [0.0, 0.0, 1.0, 0.0], [0.0, 0.0, 0.0, 1.0]]) {
          // 'header100'
          color(c=[0.0, 1.0, 0.5, 1.0]) {
            // 'header100 : _combine_solids_and_holes'
            union() {
              // 'header100'
              cube(size=[51.0, 5.1, 8.7]);
            }
          }
        }
      }
      // 'default'
      multmatrix(m=[[1.0, 0.0, 0.0, -39.0], [0.0, -1.0, 0.0, -24.5], [0.0, 0.0, -1.0, 0.02], [0.0, 0.0, 0.0, 1.0]]) {
        // "('mount_hole', 0) : _combine_solids_and_holes"
        union() {
          // ('mount_hole', 0)
          cylinder(h=3.02, r1=1.35, r2=1.35, center=false, $fn=32);
        }
      }
      // 'default'
      multmatrix(m=[[1.0, 0.0, 0.0, -39.0], [0.0, -1.0, 0.0, 24.5], [0.0, 0.0, -1.0, 0.02], [0.0, 0.0, 0.0, 1.0]]) {
        // "('mount_hole', 1) : _combine_solids_and_holes"
        union() {
          // ('mount_hole', 1)
          cylinder(h=3.02, r1=1.35, r2=1.35, center=false, $fn=32);
        }
      }
      // 'default'
      multmatrix(m=[[1.0, 0.0, 0.0, 19.0], [0.0, -1.0, 0.0, -24.5], [0.0, 0.0, -1.0, 0.02], [0.0, 0.0, 0.0, 1.0]]) {
        // "('mount_hole', 2) : _combine_solids_and_holes"
        union() {
          // ('mount_hole', 2)
          cylinder(h=3.02, r1=1.35, r2=1.35, center=false, $fn=32);
        }
      }
      // 'default'
      multmatrix(m=[[1.0, 0.0, 0.0, 19.0], [0.0, -1.0, 0.0, 24.5], [0.0, 0.0, -1.0, 0.02], [0.0, 0.0, 0.0, 1.0]]) {
        // "('mount_hole', 3) : _combine_solids_and_holes"
        union() {
          // ('mount_hole', 3)
          cylinder(h=3.02, r1=1.35, r2=1.35, center=false, $fn=32);
        }
      }
    }
  }
} // end module default_5_default_5
